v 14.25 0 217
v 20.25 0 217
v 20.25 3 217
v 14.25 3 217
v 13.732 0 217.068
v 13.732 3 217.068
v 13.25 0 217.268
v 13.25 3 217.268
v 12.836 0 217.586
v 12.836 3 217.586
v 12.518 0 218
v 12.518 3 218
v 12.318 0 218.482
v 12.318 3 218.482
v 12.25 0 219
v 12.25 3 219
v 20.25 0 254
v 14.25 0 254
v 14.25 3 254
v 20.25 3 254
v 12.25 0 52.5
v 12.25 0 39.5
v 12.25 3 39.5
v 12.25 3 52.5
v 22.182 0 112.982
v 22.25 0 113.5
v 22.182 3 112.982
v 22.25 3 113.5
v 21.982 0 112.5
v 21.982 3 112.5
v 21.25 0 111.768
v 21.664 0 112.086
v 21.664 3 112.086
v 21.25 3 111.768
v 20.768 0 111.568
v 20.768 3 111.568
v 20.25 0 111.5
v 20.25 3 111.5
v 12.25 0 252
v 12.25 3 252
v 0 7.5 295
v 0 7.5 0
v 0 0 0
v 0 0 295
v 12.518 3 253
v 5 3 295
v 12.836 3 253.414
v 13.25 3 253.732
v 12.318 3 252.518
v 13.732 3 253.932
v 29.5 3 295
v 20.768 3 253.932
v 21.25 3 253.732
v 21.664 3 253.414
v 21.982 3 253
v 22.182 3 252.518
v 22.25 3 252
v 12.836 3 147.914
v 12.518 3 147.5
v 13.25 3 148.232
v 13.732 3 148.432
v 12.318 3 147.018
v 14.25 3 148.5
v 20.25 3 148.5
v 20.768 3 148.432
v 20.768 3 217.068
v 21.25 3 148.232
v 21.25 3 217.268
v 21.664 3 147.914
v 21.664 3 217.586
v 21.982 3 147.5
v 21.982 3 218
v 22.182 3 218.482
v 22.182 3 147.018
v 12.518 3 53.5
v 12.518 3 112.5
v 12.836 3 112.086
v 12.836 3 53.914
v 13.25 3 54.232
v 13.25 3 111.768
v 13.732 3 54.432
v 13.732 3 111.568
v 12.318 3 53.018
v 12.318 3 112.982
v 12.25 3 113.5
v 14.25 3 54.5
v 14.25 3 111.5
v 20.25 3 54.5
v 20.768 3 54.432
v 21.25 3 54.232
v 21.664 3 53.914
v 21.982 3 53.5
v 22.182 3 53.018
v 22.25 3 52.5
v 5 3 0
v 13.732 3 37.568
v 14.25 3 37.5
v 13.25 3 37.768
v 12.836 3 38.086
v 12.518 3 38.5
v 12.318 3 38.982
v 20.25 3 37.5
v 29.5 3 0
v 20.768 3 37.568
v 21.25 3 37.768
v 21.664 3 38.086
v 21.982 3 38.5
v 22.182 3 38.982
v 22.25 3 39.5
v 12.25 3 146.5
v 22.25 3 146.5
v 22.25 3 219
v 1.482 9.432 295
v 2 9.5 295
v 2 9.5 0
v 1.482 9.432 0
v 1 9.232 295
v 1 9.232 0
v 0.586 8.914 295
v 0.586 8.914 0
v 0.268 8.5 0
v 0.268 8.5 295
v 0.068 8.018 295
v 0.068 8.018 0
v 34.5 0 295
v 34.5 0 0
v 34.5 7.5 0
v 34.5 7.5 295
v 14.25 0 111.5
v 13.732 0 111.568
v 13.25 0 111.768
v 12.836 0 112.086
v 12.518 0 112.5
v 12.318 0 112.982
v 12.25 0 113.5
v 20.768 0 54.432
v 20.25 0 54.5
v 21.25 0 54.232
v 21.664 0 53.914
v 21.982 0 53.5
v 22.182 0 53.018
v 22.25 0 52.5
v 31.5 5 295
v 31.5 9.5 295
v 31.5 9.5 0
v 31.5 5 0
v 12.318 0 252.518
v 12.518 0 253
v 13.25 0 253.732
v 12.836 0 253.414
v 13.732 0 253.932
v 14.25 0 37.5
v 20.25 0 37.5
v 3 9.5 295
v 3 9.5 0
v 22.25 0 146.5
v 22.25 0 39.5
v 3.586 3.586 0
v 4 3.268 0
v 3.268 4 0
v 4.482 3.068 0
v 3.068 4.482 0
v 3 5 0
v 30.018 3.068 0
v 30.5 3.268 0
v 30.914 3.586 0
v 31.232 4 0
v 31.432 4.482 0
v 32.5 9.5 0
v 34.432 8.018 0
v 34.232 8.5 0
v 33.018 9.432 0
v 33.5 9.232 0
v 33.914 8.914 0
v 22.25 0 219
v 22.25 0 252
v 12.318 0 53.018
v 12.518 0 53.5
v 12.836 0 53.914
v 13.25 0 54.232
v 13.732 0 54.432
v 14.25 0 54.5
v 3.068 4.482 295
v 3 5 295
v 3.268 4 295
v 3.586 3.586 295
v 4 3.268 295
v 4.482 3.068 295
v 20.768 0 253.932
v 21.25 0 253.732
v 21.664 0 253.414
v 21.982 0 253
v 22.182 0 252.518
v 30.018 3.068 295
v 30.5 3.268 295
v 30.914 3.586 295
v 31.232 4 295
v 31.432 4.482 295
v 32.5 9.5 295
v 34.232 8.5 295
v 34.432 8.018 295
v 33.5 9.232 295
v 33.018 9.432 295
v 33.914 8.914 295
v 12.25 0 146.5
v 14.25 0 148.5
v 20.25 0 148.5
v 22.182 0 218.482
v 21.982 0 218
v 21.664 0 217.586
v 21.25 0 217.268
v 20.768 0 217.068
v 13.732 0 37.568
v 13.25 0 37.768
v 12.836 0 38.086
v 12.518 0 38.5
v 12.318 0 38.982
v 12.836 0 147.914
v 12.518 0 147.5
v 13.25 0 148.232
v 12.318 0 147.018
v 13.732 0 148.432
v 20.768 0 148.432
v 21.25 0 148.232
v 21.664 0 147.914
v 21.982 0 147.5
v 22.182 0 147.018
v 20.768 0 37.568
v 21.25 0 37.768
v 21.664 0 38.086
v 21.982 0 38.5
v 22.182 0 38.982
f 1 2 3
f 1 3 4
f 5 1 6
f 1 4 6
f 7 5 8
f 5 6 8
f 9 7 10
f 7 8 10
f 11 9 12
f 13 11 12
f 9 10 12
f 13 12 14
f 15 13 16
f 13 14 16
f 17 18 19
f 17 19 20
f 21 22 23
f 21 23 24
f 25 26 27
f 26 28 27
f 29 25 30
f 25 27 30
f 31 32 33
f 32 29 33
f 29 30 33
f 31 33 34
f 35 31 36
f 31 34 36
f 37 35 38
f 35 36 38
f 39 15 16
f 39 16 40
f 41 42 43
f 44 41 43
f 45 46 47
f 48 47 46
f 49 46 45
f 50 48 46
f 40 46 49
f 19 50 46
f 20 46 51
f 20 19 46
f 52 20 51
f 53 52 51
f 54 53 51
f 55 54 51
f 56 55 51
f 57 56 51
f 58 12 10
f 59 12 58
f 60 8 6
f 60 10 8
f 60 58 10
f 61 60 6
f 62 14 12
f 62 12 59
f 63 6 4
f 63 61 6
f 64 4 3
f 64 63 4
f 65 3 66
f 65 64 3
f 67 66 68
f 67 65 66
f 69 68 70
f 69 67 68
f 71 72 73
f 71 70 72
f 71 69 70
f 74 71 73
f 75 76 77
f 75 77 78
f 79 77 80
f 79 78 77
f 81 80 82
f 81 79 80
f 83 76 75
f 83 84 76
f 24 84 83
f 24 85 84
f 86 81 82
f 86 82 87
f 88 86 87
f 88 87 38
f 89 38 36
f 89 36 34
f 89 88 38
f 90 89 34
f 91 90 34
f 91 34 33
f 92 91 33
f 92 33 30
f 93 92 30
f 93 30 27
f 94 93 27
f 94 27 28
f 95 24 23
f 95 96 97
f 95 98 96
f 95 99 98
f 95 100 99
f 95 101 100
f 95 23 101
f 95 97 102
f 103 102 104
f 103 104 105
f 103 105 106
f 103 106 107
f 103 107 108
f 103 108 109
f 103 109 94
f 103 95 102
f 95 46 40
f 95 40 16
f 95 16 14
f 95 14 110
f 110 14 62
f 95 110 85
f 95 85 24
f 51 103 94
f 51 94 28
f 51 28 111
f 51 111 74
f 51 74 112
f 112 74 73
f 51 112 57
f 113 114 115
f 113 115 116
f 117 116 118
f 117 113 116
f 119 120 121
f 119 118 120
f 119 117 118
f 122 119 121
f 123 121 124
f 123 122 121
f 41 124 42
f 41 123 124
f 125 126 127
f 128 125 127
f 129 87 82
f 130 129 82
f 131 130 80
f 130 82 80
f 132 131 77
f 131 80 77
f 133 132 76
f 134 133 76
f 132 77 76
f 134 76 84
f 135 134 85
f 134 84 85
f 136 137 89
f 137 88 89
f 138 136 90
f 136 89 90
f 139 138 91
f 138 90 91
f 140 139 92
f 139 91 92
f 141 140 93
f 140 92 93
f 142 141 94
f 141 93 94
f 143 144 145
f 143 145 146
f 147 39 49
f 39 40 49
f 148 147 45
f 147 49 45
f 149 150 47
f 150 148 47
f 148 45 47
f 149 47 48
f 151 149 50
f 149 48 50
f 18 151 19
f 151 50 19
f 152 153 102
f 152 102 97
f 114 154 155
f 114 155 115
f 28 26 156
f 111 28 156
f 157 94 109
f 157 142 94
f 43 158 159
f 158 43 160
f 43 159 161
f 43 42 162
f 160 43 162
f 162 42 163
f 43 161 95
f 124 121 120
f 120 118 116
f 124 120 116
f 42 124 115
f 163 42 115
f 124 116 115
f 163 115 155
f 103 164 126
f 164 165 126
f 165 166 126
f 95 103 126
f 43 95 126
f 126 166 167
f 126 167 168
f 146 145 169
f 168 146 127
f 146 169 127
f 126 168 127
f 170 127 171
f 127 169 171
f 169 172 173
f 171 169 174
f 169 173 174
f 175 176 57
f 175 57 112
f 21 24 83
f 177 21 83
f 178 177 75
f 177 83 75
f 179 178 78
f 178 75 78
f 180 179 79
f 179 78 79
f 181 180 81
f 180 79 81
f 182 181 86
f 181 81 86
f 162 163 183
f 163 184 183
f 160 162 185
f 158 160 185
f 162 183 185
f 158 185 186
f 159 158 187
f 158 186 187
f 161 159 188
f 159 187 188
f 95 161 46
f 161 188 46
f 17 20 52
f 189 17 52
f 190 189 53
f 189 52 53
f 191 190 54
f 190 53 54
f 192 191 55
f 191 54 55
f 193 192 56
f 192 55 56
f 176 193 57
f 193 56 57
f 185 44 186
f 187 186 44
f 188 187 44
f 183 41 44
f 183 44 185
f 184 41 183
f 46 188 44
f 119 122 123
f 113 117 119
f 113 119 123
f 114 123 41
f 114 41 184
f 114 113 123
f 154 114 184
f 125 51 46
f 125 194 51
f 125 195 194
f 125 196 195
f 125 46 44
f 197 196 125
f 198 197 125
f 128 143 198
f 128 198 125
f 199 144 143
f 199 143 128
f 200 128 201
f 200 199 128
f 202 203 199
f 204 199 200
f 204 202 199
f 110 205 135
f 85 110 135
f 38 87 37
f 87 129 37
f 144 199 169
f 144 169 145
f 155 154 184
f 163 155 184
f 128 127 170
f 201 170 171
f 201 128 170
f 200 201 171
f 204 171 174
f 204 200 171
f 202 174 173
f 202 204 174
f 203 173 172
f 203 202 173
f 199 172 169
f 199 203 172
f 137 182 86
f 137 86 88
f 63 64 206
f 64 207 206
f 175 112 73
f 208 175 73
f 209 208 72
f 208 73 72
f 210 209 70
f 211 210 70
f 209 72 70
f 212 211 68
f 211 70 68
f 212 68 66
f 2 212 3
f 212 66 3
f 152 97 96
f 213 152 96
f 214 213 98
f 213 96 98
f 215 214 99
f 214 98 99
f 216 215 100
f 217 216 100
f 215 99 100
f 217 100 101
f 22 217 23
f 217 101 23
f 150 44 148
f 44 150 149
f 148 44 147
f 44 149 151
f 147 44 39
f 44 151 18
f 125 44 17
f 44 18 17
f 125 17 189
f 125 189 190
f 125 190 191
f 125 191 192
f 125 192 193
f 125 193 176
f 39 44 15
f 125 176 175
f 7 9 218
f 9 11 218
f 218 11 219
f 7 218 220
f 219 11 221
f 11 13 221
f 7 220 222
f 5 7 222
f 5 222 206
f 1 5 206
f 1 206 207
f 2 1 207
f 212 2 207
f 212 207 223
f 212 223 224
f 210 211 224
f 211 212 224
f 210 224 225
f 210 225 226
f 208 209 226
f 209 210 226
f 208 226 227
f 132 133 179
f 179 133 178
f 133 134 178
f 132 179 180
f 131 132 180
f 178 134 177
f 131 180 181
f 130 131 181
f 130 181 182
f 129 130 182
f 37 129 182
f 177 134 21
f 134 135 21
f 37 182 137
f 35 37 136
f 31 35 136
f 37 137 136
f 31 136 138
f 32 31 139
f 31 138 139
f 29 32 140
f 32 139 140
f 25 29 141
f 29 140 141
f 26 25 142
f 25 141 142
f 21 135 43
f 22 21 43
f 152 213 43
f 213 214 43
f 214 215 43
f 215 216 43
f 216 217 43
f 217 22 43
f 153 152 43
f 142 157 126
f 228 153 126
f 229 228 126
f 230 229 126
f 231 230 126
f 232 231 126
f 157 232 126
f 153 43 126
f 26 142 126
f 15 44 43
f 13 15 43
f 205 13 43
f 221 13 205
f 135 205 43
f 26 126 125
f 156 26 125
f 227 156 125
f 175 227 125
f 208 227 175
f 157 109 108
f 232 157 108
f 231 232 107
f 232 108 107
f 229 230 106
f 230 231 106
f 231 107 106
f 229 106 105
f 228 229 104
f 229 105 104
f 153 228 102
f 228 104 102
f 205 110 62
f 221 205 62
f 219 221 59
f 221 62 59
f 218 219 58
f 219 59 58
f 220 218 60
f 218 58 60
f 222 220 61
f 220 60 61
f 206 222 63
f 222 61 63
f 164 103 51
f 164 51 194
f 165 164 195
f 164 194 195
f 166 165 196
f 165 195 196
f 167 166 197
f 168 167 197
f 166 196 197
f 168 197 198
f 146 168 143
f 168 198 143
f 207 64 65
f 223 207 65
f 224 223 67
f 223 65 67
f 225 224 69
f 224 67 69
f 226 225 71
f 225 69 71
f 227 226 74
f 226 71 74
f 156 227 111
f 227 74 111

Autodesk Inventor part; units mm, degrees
ref_plane "YZ Plane" through (0, 0, 0) normal (1, 0, 0) x (0, 1, 0)
ref_plane "XZ Plane" through (0, 0, 0) normal (0, 1, 0) x (-1, 0, 0)
ref_plane "XY Plane" through (0, 0, 0) normal (0, 0, 1) x (1, 0, 0)
sketch "Эскиз1" plane through (0, 0, 0) normal (0, 0, 1) x (1, 0, 0)
  line L0 (0, 0) -> (34.5, 0)
  line L1 (34.5, 0) -> (34.5, 9.5)
  line L2 (34.5, 9.5) -> (0, 9.5)
  line L3 (0, 9.5) -> (0, 0)
  line L4 (3, 9.5) -> (3, 0)
  line L5 (31.5, 9.5) -> (31.5, 0)
  line L6 (3, 3) -> (31.5, 3)
  dimension "d0" = 34.5
  dimension "d1" = 9.5
  dimension "d2" = 3
  dimension "d3" = 3
  dimension "d4" = 3
extrude "Выдавливание1" add sketch "Эскиз1" along normal blind 295 contours L3 L2 L4 L0 | L4 L6 L5 L0 | L5 L2 L1 L0
fillet "Сопряжение1" radius 2 4 edges at (3, 3, 147.5) (31.5, 3, 147.5) (34.5, 9.5, 147.5) (0, 9.5, 147.5)
sketch "Эскиз2" plane through (0, 0, 0) normal (0, -1, 0) x (1, 0, 0)
  line L0 (0, 0) -> (34.5, 0) projected
  line L1 (34.5, 0) -> (34.5, 295) projected
  line L2 (0, 295) -> (34.5, 295) projected
  line L3 (0, 0) -> (0, 295) projected
  line L4 (17.25, 295) -> (17.25, 0)
  line L5 (22.25, 217) -> (12.25, 217)
  line L6 (12.25, 217) -> (12.25, 254)
  line L7 (12.25, 254) -> (22.25, 254)
  line L8 (22.25, 254) -> (22.25, 217)
  line L9 (22.25, 217) -> (12.25, 254) construction
  line L10 (12.25, 217) -> (22.25, 254) construction
  line L11 (12.25, 111.5) -> (22.25, 111.5)
  line L12 (22.25, 111.5) -> (22.25, 148.5)
  line L13 (22.25, 148.5) -> (12.25, 148.5)
  line L14 (12.25, 148.5) -> (12.25, 111.5)
  line L15 (12.25, 111.5) -> (22.25, 148.5) construction
  line L16 (22.25, 111.5) -> (12.25, 148.5) construction
  line L17 (22.25, 37.5) -> (12.25, 37.5)
  line L18 (12.25, 37.5) -> (12.25, 54.5)
  line L19 (12.25, 54.5) -> (22.25, 54.5)
  line L20 (22.25, 54.5) -> (22.25, 37.5)
  line L21 (22.25, 37.5) -> (12.25, 54.5) construction
  line L22 (12.25, 37.5) -> (22.25, 54.5) construction
  point P0 (17.25, 235.5)
  point P1 (17.25, 130)
  point P2 (17.25, 46)
  dimension "d8" = 10
  dimension "d9" = 37
  dimension "d10" = 41
  dimension "d11" = 10
  dimension "d12" = 37
  dimension "d13" = 68.5
  dimension "d14" = 10
  dimension "d15" = 17
  dimension "d16" = 57
extrude "Выдавливание2" cut sketch "Эскиз2" against normal blind 295 contours L17 L18 L19 L4 | L4 L19 L20 L17 | L7 L8 L5 L4 | L4 L5 L6 L7 | L11 L14 L13 L4 | L4 L13 L12 L11
fillet "Сопряжение2" radius 2 12 edges at (12.25, 1.5, 148.5) (12.25, 1.5, 111.5) (22.25, 1.5, 111.5) (22.25, 1.5, 148.5) (22.25, 1.5, 54.5) (22.25, 1.5, 37.5) (12.25, 1.5, 54.5) (12.25, 1.5, 37.5) (12.25, 1.5, 217) (12.25, 1.5, 254) (22.25, 1.5, 254) (22.25, 1.5, 217)
properties part number "2 часть направляшки"
